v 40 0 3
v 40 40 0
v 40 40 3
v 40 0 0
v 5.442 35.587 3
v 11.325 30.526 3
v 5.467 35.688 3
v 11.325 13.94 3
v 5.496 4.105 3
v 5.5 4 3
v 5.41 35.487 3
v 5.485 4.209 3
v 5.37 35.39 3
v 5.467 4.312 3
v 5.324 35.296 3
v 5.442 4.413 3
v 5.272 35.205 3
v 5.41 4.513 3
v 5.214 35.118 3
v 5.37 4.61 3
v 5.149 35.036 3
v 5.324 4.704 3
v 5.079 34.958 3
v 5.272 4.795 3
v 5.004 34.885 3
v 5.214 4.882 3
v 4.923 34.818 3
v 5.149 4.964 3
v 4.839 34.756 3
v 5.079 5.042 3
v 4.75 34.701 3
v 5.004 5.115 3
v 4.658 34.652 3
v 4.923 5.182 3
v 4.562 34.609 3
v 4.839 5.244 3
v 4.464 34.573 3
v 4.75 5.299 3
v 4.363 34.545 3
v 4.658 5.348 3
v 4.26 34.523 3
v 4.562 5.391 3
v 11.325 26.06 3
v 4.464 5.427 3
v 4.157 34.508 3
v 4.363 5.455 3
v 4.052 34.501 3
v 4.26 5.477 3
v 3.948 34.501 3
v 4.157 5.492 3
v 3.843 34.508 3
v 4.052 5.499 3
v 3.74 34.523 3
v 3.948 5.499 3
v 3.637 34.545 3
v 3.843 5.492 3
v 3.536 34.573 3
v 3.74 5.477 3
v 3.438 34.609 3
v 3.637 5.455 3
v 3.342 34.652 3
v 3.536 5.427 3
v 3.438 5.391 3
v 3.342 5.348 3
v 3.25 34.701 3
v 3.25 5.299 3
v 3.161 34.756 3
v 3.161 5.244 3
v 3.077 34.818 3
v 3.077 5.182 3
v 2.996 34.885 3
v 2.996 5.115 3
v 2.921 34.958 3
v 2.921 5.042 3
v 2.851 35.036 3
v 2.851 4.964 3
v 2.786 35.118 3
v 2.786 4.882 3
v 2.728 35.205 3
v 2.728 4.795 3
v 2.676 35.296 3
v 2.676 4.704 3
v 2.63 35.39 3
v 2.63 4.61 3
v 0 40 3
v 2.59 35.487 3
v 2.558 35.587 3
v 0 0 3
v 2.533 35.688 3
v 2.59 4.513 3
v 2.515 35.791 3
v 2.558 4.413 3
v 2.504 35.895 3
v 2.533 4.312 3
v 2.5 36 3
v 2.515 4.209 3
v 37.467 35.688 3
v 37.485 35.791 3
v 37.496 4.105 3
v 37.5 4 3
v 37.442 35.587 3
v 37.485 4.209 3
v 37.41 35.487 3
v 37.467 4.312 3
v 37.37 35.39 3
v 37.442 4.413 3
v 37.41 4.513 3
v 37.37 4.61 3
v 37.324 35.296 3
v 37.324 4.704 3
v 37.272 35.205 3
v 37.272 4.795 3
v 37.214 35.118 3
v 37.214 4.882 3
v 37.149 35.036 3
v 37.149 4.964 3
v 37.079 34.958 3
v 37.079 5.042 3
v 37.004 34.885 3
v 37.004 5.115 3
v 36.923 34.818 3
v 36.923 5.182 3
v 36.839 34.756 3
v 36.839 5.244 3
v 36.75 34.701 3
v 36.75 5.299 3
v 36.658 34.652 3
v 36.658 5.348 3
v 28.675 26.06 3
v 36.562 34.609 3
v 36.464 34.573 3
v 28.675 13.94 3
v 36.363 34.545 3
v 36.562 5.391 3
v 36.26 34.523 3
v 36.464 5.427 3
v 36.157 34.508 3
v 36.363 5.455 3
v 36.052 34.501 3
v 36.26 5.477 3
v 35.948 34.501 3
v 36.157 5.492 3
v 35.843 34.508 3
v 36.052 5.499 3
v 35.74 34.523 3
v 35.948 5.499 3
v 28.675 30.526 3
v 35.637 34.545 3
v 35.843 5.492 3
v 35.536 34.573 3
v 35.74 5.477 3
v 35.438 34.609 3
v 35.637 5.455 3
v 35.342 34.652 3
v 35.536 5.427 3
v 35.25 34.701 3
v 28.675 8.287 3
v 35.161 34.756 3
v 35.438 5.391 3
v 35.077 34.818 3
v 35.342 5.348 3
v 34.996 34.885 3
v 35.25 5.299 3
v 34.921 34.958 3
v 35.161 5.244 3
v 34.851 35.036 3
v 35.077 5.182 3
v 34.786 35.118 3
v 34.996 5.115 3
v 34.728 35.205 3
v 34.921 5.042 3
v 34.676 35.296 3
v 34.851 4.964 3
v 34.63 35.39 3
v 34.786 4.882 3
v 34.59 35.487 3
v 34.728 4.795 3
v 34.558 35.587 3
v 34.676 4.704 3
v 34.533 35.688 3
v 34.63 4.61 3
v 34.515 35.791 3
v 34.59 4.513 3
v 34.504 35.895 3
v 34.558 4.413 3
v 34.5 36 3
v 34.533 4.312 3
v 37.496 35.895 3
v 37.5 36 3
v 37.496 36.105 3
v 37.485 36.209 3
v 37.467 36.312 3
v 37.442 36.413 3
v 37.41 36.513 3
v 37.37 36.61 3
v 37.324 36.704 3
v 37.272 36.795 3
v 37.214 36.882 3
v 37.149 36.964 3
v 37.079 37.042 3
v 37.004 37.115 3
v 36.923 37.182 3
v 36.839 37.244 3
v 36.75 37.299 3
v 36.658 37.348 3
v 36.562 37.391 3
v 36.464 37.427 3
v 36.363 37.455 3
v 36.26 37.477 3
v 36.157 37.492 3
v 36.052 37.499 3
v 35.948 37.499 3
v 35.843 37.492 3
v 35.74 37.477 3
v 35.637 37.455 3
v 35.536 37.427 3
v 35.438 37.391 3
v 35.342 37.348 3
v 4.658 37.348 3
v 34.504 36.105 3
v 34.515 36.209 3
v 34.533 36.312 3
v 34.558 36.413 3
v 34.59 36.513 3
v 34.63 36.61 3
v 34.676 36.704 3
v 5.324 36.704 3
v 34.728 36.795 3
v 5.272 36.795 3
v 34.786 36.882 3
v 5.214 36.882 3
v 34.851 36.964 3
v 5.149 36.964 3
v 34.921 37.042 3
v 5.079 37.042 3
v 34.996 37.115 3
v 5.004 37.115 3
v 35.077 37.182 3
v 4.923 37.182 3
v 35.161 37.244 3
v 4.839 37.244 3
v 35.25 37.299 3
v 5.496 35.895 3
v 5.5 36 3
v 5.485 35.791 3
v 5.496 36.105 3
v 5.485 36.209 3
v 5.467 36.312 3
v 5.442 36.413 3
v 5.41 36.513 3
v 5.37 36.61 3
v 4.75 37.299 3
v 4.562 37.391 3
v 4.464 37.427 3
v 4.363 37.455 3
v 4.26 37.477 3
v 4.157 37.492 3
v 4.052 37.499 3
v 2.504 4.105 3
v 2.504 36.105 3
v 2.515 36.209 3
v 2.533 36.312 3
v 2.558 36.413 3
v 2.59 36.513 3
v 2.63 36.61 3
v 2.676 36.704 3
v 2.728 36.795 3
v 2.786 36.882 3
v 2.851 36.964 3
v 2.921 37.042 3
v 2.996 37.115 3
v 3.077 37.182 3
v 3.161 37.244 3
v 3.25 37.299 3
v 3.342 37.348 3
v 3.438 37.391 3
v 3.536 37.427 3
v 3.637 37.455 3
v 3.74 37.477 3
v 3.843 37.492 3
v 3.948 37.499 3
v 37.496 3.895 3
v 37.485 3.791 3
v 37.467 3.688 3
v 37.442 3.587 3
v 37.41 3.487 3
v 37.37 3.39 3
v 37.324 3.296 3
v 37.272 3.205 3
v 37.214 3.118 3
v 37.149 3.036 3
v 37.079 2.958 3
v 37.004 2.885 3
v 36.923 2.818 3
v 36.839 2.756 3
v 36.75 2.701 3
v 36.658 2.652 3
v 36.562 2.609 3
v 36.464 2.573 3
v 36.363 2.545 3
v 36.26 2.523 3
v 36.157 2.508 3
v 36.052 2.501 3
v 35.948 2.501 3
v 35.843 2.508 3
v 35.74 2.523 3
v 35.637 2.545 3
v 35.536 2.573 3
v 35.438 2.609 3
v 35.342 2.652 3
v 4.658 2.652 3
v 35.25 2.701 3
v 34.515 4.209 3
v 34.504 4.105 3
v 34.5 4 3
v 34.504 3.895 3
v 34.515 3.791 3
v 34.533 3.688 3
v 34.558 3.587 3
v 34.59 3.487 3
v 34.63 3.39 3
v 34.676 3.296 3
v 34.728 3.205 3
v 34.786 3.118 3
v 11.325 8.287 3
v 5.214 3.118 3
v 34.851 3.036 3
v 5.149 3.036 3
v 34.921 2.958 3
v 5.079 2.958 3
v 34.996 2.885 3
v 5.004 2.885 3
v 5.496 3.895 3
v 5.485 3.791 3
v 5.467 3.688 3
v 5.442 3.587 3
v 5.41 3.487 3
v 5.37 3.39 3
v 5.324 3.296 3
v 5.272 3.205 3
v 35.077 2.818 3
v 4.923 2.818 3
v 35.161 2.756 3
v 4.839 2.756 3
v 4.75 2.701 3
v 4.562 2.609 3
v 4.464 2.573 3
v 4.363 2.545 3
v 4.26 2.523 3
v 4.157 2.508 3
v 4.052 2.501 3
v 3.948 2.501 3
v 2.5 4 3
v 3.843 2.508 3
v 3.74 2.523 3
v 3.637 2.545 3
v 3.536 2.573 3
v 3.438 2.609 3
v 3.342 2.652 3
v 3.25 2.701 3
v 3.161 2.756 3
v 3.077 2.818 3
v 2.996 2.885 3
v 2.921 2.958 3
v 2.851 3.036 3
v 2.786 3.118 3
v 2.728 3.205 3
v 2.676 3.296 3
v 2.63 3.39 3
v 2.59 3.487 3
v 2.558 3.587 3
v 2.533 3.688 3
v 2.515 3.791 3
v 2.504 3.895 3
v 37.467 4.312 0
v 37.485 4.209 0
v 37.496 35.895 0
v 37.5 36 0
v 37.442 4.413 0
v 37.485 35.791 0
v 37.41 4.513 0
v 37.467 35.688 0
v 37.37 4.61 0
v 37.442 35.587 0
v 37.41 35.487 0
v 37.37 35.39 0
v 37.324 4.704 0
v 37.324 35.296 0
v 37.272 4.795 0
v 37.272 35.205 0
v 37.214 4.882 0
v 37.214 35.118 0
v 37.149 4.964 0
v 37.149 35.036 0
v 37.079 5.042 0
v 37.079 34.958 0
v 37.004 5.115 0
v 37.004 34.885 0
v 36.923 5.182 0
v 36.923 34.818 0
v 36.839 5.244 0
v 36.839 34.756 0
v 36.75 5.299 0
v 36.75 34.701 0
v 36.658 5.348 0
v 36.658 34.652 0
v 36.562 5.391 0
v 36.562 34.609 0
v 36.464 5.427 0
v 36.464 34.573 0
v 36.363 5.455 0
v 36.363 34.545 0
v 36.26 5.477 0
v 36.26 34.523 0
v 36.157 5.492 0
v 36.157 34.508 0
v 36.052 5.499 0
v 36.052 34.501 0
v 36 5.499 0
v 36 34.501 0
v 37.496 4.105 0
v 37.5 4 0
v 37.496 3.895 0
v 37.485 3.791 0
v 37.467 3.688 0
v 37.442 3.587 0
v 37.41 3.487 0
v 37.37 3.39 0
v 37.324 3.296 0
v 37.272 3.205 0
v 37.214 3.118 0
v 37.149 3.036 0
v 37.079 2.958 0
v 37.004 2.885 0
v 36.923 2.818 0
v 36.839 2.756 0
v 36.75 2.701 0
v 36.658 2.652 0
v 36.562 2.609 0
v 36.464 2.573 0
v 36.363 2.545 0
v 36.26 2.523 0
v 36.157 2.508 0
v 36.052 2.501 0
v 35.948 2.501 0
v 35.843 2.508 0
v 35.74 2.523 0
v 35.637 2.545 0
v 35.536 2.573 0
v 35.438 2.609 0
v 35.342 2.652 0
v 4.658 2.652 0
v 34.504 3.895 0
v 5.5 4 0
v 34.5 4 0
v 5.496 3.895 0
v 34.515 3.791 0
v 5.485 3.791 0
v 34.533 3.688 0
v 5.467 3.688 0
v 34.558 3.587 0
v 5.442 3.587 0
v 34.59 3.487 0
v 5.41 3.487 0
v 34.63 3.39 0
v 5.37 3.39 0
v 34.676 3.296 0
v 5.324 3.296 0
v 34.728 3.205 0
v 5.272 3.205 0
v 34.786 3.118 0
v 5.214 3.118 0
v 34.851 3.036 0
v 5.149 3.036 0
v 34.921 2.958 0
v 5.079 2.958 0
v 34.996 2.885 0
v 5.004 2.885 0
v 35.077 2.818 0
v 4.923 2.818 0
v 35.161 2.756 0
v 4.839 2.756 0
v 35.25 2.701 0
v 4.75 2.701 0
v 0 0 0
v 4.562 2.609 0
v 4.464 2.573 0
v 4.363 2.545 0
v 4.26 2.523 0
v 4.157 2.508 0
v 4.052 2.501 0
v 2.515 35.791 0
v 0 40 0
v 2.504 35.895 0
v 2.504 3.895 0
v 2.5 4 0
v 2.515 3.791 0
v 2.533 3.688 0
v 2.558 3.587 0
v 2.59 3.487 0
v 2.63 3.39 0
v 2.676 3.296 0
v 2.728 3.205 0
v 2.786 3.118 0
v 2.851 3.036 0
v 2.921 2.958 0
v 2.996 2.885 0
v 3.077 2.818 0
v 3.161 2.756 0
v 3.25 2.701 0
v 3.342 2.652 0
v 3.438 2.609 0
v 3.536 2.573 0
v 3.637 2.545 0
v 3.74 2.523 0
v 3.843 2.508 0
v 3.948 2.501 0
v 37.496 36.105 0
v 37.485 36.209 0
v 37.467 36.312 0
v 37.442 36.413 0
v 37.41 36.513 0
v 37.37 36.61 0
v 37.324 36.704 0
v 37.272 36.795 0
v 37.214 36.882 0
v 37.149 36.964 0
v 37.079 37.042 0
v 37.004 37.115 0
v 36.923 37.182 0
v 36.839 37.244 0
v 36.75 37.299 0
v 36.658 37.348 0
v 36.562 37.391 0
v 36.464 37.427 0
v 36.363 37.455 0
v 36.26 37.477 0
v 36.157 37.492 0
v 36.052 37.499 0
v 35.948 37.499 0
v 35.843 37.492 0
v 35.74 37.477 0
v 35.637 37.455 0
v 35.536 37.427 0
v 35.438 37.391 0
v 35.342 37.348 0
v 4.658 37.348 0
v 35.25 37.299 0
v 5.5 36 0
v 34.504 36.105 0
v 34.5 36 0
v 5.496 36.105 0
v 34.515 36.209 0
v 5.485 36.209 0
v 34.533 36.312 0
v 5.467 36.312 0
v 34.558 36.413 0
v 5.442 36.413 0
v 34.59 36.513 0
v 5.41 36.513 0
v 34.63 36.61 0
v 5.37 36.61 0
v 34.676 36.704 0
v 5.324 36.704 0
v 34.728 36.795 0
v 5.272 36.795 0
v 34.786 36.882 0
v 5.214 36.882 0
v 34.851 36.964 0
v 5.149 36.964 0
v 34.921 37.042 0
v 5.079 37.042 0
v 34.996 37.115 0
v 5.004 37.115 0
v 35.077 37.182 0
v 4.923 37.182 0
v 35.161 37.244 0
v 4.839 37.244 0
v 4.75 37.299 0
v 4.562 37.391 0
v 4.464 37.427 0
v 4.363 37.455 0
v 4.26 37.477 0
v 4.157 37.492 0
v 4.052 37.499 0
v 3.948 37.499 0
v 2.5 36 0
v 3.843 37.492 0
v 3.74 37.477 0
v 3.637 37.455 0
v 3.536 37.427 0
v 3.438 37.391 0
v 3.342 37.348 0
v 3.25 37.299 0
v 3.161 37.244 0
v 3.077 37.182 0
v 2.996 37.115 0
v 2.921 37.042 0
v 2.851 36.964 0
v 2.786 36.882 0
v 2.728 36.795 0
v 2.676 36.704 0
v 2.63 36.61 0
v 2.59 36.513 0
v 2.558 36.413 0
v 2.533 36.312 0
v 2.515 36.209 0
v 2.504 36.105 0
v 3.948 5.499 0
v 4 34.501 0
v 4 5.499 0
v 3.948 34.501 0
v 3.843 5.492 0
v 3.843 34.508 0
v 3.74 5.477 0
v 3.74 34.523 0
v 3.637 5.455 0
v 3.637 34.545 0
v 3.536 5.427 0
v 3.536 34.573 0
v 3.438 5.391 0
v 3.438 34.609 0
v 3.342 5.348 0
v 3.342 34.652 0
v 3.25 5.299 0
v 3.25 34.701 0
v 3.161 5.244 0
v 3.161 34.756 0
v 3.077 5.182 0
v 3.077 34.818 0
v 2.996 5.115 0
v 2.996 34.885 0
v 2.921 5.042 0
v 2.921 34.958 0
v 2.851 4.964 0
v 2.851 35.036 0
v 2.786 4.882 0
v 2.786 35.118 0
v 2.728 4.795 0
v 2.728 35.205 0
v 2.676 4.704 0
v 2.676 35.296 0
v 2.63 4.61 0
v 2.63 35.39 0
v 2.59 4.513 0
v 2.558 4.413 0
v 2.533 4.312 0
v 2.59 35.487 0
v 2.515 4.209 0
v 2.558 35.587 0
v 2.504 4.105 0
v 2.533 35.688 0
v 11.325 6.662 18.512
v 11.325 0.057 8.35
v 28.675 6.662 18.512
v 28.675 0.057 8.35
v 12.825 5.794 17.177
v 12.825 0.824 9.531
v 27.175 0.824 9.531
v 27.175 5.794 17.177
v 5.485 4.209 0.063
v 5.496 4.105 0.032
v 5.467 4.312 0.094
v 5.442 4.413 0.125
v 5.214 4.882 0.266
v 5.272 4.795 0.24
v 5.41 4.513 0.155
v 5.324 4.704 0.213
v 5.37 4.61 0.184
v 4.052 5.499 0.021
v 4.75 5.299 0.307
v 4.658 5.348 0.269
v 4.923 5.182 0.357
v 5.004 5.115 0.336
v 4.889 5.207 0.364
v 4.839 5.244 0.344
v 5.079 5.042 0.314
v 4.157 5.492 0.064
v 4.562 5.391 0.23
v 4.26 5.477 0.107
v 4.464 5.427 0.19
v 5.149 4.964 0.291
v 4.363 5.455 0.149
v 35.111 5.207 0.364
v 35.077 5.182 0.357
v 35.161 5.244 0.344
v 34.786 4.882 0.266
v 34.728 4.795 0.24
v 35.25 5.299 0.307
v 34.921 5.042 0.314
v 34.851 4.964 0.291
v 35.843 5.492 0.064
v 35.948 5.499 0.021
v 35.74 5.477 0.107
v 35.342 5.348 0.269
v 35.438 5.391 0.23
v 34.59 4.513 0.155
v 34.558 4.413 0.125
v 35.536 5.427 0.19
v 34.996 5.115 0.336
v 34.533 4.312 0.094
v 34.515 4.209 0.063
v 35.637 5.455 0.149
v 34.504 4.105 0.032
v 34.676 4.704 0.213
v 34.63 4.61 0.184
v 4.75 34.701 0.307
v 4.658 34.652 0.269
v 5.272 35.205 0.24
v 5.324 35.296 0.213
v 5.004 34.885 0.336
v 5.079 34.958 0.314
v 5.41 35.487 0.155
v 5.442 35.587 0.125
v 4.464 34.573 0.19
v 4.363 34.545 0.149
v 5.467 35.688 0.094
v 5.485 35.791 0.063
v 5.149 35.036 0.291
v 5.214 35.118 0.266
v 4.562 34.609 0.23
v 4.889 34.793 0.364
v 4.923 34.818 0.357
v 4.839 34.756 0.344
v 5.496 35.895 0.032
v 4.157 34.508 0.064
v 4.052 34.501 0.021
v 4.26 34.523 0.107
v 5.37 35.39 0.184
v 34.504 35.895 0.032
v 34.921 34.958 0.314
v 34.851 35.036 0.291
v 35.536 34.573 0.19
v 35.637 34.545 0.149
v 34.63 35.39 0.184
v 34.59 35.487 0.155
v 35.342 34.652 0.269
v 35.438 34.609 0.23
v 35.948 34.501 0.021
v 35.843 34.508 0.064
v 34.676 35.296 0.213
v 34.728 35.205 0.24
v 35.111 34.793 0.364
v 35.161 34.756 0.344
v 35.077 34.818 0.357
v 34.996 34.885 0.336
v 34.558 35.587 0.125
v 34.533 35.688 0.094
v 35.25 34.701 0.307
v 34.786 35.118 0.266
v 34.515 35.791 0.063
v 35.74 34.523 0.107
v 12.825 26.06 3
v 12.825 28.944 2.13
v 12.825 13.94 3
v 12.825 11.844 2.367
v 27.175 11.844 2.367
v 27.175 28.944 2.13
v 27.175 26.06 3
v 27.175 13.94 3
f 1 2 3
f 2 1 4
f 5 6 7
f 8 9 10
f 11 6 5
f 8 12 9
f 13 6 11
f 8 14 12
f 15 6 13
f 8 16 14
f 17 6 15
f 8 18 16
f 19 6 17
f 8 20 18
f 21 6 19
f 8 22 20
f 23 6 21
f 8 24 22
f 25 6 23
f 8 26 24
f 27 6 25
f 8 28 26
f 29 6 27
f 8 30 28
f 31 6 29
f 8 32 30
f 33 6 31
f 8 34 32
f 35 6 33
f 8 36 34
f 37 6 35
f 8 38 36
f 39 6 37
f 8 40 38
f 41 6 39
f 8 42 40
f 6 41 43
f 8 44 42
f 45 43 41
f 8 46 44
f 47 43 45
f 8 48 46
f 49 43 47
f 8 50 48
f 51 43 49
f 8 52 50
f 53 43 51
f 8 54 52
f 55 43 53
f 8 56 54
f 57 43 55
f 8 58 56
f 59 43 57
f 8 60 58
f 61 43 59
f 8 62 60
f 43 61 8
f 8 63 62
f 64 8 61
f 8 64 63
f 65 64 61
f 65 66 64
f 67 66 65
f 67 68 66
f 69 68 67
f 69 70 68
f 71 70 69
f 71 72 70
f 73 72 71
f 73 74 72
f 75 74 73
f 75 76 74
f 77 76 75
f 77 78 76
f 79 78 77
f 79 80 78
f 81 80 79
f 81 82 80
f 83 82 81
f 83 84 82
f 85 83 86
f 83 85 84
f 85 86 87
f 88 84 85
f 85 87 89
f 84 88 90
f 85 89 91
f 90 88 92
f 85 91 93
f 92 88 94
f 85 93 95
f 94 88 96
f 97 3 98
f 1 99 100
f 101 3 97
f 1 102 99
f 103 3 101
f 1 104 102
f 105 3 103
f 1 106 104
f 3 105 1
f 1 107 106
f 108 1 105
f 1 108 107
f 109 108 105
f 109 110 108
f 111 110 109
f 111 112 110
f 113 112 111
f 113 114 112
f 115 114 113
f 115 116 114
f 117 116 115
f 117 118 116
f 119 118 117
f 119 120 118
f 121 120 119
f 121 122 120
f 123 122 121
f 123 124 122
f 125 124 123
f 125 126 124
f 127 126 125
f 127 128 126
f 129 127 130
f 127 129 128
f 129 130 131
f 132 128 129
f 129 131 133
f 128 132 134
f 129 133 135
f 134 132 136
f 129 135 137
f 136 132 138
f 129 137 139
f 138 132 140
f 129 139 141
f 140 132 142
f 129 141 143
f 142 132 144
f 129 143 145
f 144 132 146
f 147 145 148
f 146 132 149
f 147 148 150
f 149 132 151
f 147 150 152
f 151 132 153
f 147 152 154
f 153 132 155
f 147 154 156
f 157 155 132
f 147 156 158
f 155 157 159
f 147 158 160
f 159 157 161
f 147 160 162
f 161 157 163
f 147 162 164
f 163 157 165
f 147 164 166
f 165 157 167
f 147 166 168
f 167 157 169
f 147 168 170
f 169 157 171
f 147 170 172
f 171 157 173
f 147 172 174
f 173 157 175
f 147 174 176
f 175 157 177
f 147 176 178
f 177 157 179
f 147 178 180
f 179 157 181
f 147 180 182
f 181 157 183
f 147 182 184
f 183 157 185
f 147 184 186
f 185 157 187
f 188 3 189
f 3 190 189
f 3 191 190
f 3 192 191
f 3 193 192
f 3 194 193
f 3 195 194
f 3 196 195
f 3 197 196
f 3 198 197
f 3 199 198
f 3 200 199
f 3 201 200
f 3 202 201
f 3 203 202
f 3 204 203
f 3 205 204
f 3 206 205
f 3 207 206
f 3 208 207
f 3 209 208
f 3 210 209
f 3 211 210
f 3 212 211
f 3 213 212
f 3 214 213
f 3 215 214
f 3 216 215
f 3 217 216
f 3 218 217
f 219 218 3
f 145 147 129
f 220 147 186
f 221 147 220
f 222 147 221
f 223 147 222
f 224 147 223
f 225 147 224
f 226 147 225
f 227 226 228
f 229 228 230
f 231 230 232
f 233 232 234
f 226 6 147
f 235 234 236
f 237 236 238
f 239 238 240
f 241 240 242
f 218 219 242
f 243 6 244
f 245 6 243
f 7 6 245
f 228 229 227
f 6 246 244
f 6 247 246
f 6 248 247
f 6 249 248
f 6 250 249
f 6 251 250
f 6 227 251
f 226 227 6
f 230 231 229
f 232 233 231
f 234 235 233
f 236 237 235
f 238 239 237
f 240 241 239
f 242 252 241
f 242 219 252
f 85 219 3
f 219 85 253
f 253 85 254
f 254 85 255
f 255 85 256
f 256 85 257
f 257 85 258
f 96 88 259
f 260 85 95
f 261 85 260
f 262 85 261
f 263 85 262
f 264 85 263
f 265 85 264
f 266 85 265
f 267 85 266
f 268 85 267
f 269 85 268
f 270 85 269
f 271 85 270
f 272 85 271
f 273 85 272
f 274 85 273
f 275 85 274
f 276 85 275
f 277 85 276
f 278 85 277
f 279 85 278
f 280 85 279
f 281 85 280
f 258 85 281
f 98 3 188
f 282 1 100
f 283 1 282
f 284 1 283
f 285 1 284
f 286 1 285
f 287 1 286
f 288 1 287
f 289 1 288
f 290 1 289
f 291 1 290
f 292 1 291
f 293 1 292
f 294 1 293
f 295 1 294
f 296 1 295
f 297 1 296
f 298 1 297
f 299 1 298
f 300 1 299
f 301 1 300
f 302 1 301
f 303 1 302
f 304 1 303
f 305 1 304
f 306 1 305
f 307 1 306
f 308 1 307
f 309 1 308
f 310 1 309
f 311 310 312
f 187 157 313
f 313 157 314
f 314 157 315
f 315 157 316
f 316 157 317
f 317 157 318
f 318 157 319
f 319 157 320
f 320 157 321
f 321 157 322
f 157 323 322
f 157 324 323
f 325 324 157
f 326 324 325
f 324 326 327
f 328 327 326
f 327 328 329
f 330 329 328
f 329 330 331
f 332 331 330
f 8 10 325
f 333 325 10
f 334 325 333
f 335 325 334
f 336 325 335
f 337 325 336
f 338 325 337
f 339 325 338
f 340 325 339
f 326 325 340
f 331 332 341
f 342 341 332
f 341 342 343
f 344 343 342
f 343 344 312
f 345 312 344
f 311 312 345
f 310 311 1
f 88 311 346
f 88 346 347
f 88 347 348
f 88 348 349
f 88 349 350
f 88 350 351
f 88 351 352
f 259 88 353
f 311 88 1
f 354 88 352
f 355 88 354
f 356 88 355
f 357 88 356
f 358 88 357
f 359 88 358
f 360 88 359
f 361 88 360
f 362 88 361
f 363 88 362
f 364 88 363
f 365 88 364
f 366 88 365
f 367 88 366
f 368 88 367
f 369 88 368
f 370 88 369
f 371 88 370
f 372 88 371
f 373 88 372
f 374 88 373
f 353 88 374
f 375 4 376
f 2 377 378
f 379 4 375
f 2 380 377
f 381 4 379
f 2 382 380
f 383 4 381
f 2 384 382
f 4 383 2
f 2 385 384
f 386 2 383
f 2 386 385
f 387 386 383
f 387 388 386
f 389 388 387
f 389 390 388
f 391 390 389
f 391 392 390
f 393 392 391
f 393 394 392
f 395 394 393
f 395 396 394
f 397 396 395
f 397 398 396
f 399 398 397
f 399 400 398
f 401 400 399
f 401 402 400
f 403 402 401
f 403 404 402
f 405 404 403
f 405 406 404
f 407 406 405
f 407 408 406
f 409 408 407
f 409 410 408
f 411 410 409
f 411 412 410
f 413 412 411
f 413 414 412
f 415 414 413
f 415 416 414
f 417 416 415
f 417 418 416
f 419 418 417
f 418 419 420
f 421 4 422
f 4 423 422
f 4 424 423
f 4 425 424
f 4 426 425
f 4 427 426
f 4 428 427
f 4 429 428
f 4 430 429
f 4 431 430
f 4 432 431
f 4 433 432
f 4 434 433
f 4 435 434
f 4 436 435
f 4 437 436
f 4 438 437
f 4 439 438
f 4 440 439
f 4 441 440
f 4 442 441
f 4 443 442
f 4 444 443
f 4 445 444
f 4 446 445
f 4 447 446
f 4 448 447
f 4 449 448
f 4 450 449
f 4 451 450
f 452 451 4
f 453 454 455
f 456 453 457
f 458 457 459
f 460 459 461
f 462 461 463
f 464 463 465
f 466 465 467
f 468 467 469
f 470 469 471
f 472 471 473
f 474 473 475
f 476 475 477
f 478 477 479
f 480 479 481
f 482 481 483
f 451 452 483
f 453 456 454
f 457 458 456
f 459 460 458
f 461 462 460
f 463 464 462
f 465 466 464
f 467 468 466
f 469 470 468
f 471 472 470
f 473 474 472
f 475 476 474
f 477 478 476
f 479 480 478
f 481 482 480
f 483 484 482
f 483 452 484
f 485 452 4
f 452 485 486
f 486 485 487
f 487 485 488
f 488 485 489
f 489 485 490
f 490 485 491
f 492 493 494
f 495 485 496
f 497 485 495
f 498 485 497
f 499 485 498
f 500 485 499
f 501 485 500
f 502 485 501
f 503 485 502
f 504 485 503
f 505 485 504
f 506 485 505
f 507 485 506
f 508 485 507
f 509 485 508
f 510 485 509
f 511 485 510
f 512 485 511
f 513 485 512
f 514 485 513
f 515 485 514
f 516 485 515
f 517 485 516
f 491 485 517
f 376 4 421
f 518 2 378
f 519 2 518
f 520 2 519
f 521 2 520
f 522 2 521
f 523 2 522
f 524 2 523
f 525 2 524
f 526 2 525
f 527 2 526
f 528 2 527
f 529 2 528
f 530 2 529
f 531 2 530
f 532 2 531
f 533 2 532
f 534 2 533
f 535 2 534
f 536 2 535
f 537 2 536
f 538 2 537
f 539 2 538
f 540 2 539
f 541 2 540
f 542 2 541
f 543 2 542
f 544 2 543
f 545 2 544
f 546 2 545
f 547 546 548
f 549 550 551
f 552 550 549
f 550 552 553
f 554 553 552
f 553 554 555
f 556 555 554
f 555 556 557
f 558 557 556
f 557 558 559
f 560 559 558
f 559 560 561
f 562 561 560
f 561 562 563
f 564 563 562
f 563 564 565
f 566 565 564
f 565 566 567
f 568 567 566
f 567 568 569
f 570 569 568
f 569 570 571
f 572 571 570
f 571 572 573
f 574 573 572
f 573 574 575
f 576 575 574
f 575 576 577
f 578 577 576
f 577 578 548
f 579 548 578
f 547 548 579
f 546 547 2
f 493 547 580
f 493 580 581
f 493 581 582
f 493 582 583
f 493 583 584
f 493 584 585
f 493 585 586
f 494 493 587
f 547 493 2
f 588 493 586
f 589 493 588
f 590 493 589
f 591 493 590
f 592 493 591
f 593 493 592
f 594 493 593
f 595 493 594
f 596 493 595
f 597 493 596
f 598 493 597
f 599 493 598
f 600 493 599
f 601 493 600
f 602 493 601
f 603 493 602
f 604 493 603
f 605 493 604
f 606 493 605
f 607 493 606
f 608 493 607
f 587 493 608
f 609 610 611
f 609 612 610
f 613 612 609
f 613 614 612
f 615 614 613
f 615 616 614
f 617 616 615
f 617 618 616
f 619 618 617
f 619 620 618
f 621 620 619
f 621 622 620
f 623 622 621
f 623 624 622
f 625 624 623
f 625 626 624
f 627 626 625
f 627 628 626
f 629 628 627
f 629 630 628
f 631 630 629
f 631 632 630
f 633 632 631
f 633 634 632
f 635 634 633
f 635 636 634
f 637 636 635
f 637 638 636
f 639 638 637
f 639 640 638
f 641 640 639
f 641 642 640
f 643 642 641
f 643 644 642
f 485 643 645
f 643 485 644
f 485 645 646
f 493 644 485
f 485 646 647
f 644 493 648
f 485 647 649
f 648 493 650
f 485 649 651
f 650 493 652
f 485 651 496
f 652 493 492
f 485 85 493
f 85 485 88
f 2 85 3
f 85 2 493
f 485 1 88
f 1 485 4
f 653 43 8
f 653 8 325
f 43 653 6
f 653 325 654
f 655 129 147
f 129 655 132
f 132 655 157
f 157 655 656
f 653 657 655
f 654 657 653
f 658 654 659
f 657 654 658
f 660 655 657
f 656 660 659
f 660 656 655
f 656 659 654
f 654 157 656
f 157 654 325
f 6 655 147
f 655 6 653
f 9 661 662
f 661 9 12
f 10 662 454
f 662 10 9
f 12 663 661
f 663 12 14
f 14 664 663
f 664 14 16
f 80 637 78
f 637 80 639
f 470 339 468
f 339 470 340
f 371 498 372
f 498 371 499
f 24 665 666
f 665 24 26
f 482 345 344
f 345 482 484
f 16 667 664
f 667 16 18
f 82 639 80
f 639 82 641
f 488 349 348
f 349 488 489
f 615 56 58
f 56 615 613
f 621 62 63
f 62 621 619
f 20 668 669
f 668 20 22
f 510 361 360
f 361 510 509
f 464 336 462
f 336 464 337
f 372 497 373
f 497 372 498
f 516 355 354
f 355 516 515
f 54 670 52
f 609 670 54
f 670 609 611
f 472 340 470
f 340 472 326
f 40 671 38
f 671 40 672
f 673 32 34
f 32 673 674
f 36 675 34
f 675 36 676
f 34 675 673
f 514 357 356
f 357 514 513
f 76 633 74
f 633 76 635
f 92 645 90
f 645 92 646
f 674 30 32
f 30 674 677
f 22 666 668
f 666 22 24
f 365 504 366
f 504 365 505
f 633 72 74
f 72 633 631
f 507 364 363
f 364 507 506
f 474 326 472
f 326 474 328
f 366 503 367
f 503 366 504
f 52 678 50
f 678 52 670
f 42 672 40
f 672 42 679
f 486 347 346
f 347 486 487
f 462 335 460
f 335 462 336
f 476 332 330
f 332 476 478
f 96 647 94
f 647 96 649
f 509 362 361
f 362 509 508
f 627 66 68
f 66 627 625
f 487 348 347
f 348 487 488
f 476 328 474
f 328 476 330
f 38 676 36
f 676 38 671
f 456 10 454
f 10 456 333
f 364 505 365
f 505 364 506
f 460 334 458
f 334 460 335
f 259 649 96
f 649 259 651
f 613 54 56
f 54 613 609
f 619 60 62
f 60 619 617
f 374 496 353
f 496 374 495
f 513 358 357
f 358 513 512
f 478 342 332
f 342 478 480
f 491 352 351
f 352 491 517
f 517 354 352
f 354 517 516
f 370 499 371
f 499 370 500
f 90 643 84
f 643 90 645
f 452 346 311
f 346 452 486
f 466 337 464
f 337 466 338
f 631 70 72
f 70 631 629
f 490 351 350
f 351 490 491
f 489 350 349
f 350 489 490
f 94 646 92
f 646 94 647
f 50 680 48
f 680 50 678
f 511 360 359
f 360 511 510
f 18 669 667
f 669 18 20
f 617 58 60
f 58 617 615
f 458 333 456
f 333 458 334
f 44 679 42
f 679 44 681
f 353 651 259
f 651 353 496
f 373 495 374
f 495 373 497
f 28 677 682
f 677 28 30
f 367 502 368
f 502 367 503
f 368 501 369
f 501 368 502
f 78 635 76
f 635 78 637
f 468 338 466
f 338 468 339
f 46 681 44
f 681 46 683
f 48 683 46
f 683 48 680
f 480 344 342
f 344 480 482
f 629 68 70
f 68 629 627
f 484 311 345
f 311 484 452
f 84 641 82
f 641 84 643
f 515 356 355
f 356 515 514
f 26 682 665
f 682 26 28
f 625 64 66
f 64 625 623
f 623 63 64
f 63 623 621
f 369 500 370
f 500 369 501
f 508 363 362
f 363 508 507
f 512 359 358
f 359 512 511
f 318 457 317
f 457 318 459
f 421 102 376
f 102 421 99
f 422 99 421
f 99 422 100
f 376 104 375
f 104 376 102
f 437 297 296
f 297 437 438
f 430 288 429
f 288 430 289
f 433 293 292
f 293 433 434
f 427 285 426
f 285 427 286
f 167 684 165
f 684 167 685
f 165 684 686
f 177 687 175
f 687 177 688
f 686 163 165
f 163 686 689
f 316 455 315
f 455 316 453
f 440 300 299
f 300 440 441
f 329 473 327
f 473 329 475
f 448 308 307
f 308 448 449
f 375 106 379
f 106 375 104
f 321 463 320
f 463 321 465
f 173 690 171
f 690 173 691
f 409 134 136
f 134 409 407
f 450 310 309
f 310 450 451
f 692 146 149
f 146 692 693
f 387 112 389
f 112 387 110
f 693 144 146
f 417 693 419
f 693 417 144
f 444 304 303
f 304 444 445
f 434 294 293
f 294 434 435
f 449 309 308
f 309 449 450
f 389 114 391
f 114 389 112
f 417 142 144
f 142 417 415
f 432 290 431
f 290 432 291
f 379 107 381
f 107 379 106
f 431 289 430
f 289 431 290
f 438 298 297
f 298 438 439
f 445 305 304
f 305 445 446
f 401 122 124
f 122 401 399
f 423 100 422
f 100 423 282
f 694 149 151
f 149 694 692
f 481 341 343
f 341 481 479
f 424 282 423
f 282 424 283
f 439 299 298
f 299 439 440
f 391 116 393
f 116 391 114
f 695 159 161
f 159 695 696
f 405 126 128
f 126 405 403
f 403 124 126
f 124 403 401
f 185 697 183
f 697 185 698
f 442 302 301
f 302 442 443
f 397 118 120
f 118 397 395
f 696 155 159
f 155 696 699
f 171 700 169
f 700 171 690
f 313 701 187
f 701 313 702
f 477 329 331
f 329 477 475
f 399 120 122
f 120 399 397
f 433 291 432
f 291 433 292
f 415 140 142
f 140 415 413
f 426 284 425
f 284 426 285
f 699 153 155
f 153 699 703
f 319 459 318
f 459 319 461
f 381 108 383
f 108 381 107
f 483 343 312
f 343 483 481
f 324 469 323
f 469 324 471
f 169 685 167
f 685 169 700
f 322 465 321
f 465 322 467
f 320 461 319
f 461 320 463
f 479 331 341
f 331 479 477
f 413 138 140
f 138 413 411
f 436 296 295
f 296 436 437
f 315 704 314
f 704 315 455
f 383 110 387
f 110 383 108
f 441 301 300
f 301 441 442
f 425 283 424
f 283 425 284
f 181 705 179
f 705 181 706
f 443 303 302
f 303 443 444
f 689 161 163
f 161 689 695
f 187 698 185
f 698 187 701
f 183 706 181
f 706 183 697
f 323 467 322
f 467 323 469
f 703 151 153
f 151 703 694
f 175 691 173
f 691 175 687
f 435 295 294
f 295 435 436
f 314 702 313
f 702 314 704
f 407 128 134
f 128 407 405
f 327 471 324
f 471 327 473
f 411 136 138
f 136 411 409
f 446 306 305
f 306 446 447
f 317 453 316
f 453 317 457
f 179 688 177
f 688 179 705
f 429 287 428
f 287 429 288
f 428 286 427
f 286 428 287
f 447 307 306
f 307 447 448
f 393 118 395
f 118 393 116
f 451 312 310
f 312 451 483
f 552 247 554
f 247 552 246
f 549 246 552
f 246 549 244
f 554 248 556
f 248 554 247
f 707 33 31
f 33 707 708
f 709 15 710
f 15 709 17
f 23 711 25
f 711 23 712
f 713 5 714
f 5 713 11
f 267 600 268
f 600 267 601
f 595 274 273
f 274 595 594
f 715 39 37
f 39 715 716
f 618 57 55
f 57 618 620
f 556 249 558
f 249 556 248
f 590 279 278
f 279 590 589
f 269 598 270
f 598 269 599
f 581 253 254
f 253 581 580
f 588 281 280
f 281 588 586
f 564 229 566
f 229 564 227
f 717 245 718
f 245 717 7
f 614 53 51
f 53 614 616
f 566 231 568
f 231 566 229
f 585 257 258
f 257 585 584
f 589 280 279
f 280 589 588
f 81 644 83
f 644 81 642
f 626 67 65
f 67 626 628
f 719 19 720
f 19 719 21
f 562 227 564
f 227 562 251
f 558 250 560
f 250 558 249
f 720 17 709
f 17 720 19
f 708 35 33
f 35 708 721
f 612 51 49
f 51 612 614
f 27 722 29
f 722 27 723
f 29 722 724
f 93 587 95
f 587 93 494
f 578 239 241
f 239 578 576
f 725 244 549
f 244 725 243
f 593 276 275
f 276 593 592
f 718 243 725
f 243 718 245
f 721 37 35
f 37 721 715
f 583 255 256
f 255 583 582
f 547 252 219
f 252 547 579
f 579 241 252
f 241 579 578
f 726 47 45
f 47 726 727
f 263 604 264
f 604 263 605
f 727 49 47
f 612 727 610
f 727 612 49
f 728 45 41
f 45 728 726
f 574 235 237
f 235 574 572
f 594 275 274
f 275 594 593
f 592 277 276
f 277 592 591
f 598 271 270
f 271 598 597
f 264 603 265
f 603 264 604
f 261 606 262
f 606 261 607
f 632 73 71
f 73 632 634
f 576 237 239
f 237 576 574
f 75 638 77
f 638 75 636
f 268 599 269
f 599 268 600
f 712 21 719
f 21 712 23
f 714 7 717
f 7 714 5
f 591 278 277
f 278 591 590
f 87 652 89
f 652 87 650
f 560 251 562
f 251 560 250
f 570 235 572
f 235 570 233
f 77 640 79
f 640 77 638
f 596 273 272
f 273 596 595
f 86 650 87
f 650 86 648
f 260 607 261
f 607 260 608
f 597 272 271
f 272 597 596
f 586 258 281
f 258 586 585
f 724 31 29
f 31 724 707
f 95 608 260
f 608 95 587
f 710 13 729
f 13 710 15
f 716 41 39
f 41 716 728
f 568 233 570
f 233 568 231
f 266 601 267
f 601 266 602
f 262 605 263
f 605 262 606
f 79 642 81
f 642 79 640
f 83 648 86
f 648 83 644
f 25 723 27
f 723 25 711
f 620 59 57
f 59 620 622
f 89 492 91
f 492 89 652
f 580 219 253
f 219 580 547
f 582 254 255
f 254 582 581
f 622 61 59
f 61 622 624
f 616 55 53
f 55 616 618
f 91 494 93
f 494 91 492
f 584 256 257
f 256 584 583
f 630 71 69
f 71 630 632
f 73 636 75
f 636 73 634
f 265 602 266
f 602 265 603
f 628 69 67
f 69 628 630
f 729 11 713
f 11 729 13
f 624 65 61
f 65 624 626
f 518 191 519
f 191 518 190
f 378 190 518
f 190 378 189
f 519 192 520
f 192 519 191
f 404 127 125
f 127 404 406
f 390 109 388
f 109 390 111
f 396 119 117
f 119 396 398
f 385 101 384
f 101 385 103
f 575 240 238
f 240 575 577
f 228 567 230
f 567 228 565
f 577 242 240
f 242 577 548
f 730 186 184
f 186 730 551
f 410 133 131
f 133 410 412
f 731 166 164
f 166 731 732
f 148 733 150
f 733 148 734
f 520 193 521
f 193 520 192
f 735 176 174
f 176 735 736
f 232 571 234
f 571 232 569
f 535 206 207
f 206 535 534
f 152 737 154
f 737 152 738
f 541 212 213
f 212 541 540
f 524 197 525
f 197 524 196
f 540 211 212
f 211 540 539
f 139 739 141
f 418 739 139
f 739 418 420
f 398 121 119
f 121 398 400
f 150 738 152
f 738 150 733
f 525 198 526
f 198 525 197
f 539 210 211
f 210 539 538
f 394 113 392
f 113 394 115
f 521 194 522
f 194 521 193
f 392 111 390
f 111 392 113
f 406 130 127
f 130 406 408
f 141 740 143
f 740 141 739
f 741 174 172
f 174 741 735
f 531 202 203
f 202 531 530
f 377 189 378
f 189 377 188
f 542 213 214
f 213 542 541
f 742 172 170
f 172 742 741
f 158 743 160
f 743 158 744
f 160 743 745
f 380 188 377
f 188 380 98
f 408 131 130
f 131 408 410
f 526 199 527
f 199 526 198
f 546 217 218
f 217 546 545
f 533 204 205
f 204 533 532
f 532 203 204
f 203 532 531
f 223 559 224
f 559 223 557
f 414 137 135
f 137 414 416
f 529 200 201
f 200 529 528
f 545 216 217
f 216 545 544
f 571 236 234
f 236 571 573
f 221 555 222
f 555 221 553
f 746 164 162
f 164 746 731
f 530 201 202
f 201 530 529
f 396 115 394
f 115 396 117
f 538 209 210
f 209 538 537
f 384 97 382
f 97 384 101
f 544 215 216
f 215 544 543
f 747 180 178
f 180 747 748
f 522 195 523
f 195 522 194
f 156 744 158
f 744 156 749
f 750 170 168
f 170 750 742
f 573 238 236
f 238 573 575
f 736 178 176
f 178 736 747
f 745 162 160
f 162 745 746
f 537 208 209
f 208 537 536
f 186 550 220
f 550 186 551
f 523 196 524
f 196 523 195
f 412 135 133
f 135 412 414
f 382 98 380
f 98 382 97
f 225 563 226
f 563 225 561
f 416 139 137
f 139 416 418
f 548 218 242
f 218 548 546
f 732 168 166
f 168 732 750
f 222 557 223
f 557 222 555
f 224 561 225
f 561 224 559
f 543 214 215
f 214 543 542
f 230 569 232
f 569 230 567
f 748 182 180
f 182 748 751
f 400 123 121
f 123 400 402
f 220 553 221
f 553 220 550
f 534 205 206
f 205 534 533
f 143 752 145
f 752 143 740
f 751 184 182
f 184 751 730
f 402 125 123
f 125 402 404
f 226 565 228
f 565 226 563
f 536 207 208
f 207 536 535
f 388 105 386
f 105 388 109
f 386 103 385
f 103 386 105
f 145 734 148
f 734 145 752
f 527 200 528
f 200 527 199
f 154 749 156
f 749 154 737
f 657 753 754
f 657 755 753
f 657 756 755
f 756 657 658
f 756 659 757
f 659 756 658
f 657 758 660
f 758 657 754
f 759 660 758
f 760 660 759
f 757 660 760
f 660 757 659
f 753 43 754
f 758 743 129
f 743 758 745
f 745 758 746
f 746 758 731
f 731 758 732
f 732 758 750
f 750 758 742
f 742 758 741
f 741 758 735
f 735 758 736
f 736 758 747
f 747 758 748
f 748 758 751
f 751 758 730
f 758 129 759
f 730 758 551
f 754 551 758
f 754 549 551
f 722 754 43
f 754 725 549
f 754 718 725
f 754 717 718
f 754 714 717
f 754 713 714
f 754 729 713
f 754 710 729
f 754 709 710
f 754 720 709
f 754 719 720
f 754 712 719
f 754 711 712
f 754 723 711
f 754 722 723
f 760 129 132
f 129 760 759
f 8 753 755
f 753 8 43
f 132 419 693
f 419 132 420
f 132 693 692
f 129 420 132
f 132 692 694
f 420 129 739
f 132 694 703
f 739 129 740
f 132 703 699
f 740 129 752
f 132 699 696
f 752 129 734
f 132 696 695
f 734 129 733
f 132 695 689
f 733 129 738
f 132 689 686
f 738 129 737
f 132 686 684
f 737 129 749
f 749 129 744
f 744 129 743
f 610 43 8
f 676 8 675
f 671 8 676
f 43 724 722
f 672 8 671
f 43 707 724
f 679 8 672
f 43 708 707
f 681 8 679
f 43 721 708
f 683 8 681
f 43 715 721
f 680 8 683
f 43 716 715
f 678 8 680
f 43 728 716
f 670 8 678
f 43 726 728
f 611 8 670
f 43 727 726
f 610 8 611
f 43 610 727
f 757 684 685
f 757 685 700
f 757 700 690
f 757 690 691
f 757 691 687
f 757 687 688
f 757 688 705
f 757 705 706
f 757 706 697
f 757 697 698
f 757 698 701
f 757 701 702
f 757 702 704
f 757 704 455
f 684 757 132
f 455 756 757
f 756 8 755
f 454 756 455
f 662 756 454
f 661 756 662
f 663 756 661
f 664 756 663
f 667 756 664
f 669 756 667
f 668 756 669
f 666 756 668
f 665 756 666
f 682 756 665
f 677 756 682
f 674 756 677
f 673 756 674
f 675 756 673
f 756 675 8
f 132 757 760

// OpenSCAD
$fn=90;

base = [40,40,3];
holeSeparation=[32,32];
fanInsert = [17.35,12.12,3];
wallThickness = 1.5;
angle = asin((24.91-3.11)/40);

module holes()
{
	cylinder(d=3, h=8);
	translate([holeSeparation.x,0,0])cylinder(d=3, h=8);
	translate([0,holeSeparation.y,0])cylinder(d=3, h=8);
	translate([holeSeparation.x,holeSeparation.y,0])cylinder(d=3, h=8);
}

module adapter()
{
	difference(){
		union(){
			cube(base);
			
			color("green")
			translate([(base.x-fanInsert.x)/2,(fanInsert.y*2.08),-8])
			rotate([90-angle,0,0])
			cube([fanInsert.x,fanInsert.y,30]);
			
			//translate([(base.x-fanInsert.x)/2,(fanInsert.y*.75),base.z])
			//rotate([90-angle,0,0])
			//cube(fanInsert);
		}
		translate([(base.x-holeSeparation.x)/2,(base.y-holeSeparation.y)/2,-.01])
		holes();
		
		color("blue")
		rotate([90-angle,0,0])
		translate([(base.x-fanInsert.x)/2+wallThickness,(base.y-fanInsert.y)/2+wallThickness-7,-40])
		cube([fanInsert.x-wallThickness*2, fanInsert.y-wallThickness*2,900]);
		
		translate([0,0,-500])
		cube([base.x,base.y,500]);
		translate([(base.x-holeSeparation.x)/2,(base.y-holeSeparation.y)/2,-.01])
		hull(){
			//top
			translate([(holeSeparation.x-fanInsert.x)/2, (holeSeparation.y-fanInsert.y)/2, base.z])
			cube([fanInsert.x,fanInsert.y,.01]);
			//bottom
			cube([holeSeparation.x,holeSeparation.y,.01]);
		}
	}
}


//rotate([angle,0,0])
adapter();
